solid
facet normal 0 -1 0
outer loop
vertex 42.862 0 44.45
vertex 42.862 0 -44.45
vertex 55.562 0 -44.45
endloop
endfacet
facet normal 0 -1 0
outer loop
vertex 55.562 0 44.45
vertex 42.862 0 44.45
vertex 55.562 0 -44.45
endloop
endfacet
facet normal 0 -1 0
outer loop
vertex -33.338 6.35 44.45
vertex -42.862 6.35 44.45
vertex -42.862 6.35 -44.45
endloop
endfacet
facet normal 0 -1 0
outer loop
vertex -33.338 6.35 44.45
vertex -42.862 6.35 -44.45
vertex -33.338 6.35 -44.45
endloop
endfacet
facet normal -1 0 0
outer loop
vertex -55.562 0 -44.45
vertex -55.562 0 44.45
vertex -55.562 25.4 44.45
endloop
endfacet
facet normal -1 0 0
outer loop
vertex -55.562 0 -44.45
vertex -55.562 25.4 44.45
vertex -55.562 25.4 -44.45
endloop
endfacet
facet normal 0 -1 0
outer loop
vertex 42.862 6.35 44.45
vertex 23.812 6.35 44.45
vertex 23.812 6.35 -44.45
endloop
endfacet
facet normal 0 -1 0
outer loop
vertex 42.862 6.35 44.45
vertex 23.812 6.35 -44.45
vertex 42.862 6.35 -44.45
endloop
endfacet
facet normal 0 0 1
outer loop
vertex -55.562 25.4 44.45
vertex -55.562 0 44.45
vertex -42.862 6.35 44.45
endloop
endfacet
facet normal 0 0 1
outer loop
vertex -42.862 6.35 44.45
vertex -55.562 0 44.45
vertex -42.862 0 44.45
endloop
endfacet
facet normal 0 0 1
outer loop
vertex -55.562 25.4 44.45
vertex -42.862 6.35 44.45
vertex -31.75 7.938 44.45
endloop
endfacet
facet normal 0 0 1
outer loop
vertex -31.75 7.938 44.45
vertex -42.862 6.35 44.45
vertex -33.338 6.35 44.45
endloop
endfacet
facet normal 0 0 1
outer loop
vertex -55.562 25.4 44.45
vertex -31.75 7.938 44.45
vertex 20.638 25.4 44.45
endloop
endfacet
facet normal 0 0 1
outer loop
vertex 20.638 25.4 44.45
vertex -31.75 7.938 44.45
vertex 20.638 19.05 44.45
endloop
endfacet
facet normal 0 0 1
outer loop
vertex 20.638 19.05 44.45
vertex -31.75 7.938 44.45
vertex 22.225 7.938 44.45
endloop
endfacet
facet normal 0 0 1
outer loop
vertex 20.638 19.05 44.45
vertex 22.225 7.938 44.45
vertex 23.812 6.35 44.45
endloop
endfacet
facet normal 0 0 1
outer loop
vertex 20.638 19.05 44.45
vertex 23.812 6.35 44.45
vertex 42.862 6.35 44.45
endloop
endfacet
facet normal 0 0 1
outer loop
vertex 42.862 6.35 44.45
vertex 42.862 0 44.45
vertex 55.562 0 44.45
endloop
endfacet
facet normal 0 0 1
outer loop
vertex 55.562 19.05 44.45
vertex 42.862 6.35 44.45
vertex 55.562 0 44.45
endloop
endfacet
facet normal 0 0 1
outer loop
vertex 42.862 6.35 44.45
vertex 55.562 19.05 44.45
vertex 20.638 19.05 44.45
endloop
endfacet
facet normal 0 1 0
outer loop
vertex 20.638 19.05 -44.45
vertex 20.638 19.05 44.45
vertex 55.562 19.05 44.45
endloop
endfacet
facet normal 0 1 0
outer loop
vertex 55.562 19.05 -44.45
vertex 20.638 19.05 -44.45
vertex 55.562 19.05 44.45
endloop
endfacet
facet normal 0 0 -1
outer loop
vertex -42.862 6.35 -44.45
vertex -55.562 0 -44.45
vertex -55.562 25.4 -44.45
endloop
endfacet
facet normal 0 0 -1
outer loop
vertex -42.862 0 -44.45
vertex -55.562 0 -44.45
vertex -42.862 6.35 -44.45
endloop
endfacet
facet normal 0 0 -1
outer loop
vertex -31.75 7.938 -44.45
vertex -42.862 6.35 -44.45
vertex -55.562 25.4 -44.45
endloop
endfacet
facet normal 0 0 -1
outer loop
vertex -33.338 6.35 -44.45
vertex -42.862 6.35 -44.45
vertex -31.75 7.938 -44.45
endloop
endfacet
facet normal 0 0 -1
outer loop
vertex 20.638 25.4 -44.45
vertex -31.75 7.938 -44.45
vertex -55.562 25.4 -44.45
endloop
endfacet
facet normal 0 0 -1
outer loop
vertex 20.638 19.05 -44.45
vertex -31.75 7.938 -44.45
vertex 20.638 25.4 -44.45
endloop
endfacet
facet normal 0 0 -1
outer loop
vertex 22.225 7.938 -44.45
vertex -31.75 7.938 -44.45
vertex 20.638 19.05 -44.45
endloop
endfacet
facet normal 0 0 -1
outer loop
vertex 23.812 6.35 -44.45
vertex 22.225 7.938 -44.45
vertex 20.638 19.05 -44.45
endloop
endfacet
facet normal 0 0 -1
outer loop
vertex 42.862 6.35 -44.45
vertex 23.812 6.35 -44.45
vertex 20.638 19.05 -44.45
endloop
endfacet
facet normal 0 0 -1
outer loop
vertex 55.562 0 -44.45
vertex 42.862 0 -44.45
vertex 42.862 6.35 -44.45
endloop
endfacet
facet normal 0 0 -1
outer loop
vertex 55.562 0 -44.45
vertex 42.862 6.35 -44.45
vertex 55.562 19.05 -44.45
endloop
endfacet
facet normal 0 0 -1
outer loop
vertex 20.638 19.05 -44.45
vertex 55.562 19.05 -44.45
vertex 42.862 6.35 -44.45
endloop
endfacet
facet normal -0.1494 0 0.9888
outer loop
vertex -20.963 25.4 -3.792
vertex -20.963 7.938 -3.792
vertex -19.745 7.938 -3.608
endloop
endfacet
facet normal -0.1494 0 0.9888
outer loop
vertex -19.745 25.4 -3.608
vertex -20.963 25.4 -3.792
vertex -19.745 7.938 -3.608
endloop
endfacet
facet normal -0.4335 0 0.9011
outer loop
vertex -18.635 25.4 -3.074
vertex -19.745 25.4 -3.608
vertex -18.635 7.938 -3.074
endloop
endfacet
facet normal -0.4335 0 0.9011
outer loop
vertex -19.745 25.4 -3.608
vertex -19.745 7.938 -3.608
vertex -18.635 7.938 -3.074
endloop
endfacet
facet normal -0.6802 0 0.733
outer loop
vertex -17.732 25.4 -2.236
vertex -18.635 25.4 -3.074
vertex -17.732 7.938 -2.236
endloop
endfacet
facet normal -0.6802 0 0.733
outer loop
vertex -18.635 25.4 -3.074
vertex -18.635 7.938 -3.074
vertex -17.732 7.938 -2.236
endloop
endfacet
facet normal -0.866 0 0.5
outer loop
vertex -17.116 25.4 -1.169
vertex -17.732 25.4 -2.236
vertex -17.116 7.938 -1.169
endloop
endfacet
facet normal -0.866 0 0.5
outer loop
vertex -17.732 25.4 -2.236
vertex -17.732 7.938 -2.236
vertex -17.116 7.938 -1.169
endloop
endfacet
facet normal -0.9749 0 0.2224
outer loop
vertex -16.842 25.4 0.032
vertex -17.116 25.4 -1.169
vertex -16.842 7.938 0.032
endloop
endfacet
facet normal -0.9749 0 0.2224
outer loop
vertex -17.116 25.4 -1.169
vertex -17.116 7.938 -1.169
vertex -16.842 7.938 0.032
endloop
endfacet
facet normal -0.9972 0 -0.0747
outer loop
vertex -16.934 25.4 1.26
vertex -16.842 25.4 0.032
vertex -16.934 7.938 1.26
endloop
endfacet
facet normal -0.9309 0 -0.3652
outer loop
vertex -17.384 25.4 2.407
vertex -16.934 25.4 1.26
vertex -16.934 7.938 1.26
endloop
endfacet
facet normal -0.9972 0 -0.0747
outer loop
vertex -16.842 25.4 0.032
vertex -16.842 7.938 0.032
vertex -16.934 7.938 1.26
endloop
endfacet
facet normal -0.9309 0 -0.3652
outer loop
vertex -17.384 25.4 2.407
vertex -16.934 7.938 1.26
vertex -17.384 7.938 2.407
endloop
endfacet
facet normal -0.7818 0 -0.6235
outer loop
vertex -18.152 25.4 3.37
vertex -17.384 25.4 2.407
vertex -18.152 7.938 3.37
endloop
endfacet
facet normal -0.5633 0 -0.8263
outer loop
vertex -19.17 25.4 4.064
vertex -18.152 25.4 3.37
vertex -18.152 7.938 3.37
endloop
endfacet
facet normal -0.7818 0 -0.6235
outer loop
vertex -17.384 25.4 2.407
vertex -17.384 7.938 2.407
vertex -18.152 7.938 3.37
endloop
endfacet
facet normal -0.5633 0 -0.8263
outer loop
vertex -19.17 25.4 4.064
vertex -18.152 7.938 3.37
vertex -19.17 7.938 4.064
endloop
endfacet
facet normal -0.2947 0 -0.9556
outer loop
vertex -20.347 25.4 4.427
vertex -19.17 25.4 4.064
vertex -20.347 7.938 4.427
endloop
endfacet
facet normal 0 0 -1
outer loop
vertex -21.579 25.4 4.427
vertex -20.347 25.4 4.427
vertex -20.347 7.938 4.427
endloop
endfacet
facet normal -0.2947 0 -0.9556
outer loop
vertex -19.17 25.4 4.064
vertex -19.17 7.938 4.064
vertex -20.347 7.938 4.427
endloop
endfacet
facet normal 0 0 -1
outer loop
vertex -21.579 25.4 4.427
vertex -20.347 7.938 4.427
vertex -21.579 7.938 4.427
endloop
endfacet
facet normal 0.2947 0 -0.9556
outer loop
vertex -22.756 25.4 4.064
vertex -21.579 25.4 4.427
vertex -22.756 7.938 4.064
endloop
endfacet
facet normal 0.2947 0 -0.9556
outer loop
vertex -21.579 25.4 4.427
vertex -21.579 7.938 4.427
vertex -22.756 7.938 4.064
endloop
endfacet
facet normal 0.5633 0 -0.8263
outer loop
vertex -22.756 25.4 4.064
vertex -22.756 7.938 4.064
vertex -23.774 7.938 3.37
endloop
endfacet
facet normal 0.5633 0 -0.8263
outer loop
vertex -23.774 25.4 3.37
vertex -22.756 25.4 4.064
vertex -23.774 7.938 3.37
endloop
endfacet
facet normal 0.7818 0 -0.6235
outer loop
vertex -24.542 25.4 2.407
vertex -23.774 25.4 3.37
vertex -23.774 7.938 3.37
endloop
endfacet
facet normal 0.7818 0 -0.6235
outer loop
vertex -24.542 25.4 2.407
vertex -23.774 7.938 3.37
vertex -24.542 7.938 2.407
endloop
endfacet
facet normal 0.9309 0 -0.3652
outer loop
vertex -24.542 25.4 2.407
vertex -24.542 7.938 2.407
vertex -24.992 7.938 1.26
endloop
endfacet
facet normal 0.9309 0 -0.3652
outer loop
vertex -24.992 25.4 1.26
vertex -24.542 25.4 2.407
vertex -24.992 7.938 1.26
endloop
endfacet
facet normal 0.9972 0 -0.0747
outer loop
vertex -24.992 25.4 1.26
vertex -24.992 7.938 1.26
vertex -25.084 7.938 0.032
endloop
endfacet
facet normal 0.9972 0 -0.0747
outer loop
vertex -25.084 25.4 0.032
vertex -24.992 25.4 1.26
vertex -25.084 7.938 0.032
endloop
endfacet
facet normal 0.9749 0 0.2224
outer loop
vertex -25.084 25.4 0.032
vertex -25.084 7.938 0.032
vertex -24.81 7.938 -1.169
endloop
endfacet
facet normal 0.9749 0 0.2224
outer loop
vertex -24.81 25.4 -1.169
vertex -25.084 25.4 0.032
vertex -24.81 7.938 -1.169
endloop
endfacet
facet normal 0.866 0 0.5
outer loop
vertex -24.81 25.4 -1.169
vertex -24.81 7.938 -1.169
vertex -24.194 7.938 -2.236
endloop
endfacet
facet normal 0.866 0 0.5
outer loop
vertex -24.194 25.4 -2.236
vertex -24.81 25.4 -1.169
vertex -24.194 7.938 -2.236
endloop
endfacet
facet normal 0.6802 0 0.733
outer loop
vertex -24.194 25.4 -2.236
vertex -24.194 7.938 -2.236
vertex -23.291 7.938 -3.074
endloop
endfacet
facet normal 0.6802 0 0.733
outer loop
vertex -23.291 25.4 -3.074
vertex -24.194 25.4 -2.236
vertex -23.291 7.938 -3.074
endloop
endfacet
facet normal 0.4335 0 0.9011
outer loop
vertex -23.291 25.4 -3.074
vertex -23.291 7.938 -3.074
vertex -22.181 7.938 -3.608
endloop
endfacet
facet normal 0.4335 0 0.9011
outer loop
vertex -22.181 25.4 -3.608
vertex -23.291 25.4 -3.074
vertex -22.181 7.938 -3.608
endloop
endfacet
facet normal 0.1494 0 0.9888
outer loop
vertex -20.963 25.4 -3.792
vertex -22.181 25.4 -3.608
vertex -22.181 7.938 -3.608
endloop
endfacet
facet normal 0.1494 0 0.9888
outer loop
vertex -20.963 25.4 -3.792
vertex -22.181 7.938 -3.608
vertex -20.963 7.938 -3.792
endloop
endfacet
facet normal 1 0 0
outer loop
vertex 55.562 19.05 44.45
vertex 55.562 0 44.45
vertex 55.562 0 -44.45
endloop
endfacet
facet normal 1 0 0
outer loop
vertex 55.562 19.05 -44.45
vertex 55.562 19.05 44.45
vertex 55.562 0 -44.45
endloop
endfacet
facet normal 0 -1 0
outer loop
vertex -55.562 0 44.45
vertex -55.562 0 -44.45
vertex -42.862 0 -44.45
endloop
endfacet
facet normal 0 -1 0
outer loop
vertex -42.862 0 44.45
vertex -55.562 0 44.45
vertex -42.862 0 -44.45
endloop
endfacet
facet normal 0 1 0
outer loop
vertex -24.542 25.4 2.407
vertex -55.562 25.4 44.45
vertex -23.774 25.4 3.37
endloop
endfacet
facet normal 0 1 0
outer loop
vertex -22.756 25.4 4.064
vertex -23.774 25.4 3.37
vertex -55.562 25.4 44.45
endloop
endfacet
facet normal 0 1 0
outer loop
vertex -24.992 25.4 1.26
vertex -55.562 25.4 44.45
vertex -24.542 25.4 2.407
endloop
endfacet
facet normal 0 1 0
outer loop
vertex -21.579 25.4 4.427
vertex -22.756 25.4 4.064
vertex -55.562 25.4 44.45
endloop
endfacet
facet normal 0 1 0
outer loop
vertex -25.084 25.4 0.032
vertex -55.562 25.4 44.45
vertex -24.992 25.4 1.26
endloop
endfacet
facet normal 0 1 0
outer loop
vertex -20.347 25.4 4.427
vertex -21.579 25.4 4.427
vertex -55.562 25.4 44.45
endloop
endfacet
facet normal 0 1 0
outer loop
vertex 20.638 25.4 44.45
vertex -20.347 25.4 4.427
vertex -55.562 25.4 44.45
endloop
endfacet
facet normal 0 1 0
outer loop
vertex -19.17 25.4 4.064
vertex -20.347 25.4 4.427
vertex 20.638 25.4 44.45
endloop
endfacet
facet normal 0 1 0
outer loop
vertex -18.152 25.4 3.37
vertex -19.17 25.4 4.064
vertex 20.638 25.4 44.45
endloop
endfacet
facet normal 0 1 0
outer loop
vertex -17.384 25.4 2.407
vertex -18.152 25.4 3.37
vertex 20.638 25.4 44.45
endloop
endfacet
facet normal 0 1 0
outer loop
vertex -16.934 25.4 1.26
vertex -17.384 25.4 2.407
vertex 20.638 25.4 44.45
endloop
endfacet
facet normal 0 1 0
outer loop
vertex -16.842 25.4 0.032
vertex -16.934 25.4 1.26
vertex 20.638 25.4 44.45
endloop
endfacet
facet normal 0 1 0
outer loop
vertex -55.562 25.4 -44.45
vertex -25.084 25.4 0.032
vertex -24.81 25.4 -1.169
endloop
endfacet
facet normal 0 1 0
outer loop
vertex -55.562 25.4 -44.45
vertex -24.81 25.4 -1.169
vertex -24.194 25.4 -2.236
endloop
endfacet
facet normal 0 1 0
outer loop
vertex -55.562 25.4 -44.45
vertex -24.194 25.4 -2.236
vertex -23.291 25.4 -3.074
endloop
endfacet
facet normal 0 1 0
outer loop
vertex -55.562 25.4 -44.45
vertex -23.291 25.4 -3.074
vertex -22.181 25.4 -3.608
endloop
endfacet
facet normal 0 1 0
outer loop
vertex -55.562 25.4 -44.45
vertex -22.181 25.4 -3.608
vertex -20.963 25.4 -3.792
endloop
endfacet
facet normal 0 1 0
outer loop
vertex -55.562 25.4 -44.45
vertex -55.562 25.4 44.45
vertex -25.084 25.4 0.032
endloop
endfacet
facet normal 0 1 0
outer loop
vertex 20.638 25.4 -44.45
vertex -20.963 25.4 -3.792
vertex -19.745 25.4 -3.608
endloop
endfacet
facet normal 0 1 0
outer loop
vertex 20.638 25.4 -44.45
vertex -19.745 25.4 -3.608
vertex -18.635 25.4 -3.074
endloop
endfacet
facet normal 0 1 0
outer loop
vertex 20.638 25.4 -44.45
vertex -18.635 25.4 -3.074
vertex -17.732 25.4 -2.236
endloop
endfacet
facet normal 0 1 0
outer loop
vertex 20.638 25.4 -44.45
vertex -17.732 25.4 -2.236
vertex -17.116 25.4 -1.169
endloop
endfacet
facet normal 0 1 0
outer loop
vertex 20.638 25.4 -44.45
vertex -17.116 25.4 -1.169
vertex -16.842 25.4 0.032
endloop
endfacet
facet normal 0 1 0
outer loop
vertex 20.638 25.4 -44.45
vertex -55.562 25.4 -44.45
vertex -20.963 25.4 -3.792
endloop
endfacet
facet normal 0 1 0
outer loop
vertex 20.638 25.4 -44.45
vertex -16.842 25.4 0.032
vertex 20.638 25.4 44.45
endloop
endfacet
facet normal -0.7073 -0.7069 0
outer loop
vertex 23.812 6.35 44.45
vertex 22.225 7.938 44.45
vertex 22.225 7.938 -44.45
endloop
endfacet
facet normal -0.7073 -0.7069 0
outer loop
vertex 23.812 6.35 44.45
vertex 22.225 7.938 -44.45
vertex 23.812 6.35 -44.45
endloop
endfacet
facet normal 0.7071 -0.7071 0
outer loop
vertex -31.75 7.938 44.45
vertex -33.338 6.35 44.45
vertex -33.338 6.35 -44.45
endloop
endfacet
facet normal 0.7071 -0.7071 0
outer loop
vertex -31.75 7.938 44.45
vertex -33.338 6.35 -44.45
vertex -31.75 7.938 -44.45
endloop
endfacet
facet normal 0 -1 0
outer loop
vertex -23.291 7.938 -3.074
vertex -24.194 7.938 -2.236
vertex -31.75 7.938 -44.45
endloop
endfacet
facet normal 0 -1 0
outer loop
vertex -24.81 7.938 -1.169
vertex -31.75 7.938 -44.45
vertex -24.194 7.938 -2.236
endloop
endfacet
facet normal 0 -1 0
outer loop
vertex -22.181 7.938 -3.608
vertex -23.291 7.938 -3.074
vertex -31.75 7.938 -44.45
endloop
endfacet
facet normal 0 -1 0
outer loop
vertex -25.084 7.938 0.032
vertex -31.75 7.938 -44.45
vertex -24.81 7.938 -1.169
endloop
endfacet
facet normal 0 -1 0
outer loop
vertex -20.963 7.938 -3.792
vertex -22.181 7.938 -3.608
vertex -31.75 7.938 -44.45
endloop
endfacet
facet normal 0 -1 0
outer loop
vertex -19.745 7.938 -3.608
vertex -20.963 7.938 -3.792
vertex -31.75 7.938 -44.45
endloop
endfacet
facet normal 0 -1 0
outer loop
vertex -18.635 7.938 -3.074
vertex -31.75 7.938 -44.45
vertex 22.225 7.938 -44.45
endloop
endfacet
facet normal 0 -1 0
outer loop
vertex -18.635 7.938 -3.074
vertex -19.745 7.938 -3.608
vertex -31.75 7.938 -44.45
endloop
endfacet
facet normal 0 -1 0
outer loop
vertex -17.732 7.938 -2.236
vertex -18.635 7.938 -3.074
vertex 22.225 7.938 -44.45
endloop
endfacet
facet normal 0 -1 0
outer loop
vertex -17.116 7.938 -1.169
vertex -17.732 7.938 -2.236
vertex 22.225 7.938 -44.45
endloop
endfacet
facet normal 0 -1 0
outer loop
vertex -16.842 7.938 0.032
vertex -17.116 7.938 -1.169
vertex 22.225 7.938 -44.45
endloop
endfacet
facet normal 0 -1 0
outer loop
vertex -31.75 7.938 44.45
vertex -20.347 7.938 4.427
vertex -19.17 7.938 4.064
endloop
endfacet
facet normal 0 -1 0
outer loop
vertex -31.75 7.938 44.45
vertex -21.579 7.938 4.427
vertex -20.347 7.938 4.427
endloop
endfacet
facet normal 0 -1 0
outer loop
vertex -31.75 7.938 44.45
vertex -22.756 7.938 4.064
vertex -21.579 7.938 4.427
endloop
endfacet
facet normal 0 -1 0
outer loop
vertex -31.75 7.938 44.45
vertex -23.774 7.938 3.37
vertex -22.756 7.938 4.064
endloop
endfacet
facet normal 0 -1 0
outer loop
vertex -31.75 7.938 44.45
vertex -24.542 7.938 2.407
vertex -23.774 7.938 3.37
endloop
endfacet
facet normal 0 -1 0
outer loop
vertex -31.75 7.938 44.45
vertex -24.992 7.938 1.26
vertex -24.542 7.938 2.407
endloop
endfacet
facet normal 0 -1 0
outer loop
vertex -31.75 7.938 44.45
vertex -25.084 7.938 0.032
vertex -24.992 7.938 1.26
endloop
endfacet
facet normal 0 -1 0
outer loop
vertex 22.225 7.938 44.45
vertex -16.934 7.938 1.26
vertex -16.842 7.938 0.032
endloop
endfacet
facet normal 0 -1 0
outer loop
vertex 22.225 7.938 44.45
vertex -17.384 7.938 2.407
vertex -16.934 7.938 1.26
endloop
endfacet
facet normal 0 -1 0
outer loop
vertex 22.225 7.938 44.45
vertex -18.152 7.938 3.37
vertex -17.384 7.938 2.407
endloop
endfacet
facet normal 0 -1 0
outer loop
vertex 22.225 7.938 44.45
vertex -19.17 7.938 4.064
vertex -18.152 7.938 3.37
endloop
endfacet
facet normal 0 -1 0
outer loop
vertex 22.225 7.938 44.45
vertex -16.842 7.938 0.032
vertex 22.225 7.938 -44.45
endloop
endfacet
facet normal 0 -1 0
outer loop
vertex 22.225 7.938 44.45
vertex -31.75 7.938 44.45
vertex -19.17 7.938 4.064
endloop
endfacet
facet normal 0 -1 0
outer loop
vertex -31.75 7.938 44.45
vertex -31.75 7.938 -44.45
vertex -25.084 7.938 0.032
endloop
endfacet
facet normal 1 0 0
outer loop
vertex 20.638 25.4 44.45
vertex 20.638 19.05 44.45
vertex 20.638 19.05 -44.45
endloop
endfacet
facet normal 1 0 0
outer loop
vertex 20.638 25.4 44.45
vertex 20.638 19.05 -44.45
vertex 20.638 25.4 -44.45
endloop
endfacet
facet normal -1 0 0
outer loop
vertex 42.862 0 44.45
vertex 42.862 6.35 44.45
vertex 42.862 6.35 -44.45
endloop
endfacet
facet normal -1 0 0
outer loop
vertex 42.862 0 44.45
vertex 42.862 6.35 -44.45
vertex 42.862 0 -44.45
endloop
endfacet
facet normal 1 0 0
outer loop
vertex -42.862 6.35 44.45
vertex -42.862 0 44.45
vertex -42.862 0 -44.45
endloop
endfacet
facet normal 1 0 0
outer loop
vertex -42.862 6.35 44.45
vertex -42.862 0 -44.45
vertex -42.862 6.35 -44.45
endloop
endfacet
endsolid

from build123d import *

# Parameters (mm, degrees)
SKETCH1_W           = 111.125
SKETCH1_H           = 88.9
BOSS_EXTRUDE1_DEPTH = 25.4
SKETCH2_W           = 34.925
SKETCH2_H           = 6.35
CUT_EXTRUDE1_DEPTH  = 108.868259494
SKETCH3_R           = 4.13258
CUT_EXTRUDE2_DEPTH  = 74.266177821


with BuildPart() as part:
    # Sketch1 → Boss-Extrude1 (new body)
    with BuildSketch(Plane(origin=(0, 0, 0), x_dir=(1, 0, 0), z_dir=(0, 1, 0))):
        Rectangle(SKETCH1_W, SKETCH1_H)
    extrude(amount=BOSS_EXTRUDE1_DEPTH)

    # Sketch2 → Cut-Extrude1 (cut, through all)
    with BuildSketch(Plane.XY.offset(44.45)):
        Polygon((-42.8625, 0), (-42.8625, 6.35), (-33.3375, 6.35), (-31.75, 7.9375), (22.225, 7.9375), (23.8125, 6.35), (42.8625, 6.35), (42.8625, 0), align=None)
        with Locations((38.1, 22.225)):
            Rectangle(SKETCH2_W, SKETCH2_H)
    extrude(amount=-CUT_EXTRUDE1_DEPTH, mode=Mode.SUBTRACT)

    # Sketch3 → Cut-Extrude2 (cut, through all)
    with BuildSketch(Plane.XZ.offset(-7.9375)):
        with Locations(Location((-20.962711313, 0.34070329, 0), (0, 0, 270))):
            Circle(SKETCH3_R)
    extrude(amount=-CUT_EXTRUDE2_DEPTH, mode=Mode.SUBTRACT)


solid = part.part
